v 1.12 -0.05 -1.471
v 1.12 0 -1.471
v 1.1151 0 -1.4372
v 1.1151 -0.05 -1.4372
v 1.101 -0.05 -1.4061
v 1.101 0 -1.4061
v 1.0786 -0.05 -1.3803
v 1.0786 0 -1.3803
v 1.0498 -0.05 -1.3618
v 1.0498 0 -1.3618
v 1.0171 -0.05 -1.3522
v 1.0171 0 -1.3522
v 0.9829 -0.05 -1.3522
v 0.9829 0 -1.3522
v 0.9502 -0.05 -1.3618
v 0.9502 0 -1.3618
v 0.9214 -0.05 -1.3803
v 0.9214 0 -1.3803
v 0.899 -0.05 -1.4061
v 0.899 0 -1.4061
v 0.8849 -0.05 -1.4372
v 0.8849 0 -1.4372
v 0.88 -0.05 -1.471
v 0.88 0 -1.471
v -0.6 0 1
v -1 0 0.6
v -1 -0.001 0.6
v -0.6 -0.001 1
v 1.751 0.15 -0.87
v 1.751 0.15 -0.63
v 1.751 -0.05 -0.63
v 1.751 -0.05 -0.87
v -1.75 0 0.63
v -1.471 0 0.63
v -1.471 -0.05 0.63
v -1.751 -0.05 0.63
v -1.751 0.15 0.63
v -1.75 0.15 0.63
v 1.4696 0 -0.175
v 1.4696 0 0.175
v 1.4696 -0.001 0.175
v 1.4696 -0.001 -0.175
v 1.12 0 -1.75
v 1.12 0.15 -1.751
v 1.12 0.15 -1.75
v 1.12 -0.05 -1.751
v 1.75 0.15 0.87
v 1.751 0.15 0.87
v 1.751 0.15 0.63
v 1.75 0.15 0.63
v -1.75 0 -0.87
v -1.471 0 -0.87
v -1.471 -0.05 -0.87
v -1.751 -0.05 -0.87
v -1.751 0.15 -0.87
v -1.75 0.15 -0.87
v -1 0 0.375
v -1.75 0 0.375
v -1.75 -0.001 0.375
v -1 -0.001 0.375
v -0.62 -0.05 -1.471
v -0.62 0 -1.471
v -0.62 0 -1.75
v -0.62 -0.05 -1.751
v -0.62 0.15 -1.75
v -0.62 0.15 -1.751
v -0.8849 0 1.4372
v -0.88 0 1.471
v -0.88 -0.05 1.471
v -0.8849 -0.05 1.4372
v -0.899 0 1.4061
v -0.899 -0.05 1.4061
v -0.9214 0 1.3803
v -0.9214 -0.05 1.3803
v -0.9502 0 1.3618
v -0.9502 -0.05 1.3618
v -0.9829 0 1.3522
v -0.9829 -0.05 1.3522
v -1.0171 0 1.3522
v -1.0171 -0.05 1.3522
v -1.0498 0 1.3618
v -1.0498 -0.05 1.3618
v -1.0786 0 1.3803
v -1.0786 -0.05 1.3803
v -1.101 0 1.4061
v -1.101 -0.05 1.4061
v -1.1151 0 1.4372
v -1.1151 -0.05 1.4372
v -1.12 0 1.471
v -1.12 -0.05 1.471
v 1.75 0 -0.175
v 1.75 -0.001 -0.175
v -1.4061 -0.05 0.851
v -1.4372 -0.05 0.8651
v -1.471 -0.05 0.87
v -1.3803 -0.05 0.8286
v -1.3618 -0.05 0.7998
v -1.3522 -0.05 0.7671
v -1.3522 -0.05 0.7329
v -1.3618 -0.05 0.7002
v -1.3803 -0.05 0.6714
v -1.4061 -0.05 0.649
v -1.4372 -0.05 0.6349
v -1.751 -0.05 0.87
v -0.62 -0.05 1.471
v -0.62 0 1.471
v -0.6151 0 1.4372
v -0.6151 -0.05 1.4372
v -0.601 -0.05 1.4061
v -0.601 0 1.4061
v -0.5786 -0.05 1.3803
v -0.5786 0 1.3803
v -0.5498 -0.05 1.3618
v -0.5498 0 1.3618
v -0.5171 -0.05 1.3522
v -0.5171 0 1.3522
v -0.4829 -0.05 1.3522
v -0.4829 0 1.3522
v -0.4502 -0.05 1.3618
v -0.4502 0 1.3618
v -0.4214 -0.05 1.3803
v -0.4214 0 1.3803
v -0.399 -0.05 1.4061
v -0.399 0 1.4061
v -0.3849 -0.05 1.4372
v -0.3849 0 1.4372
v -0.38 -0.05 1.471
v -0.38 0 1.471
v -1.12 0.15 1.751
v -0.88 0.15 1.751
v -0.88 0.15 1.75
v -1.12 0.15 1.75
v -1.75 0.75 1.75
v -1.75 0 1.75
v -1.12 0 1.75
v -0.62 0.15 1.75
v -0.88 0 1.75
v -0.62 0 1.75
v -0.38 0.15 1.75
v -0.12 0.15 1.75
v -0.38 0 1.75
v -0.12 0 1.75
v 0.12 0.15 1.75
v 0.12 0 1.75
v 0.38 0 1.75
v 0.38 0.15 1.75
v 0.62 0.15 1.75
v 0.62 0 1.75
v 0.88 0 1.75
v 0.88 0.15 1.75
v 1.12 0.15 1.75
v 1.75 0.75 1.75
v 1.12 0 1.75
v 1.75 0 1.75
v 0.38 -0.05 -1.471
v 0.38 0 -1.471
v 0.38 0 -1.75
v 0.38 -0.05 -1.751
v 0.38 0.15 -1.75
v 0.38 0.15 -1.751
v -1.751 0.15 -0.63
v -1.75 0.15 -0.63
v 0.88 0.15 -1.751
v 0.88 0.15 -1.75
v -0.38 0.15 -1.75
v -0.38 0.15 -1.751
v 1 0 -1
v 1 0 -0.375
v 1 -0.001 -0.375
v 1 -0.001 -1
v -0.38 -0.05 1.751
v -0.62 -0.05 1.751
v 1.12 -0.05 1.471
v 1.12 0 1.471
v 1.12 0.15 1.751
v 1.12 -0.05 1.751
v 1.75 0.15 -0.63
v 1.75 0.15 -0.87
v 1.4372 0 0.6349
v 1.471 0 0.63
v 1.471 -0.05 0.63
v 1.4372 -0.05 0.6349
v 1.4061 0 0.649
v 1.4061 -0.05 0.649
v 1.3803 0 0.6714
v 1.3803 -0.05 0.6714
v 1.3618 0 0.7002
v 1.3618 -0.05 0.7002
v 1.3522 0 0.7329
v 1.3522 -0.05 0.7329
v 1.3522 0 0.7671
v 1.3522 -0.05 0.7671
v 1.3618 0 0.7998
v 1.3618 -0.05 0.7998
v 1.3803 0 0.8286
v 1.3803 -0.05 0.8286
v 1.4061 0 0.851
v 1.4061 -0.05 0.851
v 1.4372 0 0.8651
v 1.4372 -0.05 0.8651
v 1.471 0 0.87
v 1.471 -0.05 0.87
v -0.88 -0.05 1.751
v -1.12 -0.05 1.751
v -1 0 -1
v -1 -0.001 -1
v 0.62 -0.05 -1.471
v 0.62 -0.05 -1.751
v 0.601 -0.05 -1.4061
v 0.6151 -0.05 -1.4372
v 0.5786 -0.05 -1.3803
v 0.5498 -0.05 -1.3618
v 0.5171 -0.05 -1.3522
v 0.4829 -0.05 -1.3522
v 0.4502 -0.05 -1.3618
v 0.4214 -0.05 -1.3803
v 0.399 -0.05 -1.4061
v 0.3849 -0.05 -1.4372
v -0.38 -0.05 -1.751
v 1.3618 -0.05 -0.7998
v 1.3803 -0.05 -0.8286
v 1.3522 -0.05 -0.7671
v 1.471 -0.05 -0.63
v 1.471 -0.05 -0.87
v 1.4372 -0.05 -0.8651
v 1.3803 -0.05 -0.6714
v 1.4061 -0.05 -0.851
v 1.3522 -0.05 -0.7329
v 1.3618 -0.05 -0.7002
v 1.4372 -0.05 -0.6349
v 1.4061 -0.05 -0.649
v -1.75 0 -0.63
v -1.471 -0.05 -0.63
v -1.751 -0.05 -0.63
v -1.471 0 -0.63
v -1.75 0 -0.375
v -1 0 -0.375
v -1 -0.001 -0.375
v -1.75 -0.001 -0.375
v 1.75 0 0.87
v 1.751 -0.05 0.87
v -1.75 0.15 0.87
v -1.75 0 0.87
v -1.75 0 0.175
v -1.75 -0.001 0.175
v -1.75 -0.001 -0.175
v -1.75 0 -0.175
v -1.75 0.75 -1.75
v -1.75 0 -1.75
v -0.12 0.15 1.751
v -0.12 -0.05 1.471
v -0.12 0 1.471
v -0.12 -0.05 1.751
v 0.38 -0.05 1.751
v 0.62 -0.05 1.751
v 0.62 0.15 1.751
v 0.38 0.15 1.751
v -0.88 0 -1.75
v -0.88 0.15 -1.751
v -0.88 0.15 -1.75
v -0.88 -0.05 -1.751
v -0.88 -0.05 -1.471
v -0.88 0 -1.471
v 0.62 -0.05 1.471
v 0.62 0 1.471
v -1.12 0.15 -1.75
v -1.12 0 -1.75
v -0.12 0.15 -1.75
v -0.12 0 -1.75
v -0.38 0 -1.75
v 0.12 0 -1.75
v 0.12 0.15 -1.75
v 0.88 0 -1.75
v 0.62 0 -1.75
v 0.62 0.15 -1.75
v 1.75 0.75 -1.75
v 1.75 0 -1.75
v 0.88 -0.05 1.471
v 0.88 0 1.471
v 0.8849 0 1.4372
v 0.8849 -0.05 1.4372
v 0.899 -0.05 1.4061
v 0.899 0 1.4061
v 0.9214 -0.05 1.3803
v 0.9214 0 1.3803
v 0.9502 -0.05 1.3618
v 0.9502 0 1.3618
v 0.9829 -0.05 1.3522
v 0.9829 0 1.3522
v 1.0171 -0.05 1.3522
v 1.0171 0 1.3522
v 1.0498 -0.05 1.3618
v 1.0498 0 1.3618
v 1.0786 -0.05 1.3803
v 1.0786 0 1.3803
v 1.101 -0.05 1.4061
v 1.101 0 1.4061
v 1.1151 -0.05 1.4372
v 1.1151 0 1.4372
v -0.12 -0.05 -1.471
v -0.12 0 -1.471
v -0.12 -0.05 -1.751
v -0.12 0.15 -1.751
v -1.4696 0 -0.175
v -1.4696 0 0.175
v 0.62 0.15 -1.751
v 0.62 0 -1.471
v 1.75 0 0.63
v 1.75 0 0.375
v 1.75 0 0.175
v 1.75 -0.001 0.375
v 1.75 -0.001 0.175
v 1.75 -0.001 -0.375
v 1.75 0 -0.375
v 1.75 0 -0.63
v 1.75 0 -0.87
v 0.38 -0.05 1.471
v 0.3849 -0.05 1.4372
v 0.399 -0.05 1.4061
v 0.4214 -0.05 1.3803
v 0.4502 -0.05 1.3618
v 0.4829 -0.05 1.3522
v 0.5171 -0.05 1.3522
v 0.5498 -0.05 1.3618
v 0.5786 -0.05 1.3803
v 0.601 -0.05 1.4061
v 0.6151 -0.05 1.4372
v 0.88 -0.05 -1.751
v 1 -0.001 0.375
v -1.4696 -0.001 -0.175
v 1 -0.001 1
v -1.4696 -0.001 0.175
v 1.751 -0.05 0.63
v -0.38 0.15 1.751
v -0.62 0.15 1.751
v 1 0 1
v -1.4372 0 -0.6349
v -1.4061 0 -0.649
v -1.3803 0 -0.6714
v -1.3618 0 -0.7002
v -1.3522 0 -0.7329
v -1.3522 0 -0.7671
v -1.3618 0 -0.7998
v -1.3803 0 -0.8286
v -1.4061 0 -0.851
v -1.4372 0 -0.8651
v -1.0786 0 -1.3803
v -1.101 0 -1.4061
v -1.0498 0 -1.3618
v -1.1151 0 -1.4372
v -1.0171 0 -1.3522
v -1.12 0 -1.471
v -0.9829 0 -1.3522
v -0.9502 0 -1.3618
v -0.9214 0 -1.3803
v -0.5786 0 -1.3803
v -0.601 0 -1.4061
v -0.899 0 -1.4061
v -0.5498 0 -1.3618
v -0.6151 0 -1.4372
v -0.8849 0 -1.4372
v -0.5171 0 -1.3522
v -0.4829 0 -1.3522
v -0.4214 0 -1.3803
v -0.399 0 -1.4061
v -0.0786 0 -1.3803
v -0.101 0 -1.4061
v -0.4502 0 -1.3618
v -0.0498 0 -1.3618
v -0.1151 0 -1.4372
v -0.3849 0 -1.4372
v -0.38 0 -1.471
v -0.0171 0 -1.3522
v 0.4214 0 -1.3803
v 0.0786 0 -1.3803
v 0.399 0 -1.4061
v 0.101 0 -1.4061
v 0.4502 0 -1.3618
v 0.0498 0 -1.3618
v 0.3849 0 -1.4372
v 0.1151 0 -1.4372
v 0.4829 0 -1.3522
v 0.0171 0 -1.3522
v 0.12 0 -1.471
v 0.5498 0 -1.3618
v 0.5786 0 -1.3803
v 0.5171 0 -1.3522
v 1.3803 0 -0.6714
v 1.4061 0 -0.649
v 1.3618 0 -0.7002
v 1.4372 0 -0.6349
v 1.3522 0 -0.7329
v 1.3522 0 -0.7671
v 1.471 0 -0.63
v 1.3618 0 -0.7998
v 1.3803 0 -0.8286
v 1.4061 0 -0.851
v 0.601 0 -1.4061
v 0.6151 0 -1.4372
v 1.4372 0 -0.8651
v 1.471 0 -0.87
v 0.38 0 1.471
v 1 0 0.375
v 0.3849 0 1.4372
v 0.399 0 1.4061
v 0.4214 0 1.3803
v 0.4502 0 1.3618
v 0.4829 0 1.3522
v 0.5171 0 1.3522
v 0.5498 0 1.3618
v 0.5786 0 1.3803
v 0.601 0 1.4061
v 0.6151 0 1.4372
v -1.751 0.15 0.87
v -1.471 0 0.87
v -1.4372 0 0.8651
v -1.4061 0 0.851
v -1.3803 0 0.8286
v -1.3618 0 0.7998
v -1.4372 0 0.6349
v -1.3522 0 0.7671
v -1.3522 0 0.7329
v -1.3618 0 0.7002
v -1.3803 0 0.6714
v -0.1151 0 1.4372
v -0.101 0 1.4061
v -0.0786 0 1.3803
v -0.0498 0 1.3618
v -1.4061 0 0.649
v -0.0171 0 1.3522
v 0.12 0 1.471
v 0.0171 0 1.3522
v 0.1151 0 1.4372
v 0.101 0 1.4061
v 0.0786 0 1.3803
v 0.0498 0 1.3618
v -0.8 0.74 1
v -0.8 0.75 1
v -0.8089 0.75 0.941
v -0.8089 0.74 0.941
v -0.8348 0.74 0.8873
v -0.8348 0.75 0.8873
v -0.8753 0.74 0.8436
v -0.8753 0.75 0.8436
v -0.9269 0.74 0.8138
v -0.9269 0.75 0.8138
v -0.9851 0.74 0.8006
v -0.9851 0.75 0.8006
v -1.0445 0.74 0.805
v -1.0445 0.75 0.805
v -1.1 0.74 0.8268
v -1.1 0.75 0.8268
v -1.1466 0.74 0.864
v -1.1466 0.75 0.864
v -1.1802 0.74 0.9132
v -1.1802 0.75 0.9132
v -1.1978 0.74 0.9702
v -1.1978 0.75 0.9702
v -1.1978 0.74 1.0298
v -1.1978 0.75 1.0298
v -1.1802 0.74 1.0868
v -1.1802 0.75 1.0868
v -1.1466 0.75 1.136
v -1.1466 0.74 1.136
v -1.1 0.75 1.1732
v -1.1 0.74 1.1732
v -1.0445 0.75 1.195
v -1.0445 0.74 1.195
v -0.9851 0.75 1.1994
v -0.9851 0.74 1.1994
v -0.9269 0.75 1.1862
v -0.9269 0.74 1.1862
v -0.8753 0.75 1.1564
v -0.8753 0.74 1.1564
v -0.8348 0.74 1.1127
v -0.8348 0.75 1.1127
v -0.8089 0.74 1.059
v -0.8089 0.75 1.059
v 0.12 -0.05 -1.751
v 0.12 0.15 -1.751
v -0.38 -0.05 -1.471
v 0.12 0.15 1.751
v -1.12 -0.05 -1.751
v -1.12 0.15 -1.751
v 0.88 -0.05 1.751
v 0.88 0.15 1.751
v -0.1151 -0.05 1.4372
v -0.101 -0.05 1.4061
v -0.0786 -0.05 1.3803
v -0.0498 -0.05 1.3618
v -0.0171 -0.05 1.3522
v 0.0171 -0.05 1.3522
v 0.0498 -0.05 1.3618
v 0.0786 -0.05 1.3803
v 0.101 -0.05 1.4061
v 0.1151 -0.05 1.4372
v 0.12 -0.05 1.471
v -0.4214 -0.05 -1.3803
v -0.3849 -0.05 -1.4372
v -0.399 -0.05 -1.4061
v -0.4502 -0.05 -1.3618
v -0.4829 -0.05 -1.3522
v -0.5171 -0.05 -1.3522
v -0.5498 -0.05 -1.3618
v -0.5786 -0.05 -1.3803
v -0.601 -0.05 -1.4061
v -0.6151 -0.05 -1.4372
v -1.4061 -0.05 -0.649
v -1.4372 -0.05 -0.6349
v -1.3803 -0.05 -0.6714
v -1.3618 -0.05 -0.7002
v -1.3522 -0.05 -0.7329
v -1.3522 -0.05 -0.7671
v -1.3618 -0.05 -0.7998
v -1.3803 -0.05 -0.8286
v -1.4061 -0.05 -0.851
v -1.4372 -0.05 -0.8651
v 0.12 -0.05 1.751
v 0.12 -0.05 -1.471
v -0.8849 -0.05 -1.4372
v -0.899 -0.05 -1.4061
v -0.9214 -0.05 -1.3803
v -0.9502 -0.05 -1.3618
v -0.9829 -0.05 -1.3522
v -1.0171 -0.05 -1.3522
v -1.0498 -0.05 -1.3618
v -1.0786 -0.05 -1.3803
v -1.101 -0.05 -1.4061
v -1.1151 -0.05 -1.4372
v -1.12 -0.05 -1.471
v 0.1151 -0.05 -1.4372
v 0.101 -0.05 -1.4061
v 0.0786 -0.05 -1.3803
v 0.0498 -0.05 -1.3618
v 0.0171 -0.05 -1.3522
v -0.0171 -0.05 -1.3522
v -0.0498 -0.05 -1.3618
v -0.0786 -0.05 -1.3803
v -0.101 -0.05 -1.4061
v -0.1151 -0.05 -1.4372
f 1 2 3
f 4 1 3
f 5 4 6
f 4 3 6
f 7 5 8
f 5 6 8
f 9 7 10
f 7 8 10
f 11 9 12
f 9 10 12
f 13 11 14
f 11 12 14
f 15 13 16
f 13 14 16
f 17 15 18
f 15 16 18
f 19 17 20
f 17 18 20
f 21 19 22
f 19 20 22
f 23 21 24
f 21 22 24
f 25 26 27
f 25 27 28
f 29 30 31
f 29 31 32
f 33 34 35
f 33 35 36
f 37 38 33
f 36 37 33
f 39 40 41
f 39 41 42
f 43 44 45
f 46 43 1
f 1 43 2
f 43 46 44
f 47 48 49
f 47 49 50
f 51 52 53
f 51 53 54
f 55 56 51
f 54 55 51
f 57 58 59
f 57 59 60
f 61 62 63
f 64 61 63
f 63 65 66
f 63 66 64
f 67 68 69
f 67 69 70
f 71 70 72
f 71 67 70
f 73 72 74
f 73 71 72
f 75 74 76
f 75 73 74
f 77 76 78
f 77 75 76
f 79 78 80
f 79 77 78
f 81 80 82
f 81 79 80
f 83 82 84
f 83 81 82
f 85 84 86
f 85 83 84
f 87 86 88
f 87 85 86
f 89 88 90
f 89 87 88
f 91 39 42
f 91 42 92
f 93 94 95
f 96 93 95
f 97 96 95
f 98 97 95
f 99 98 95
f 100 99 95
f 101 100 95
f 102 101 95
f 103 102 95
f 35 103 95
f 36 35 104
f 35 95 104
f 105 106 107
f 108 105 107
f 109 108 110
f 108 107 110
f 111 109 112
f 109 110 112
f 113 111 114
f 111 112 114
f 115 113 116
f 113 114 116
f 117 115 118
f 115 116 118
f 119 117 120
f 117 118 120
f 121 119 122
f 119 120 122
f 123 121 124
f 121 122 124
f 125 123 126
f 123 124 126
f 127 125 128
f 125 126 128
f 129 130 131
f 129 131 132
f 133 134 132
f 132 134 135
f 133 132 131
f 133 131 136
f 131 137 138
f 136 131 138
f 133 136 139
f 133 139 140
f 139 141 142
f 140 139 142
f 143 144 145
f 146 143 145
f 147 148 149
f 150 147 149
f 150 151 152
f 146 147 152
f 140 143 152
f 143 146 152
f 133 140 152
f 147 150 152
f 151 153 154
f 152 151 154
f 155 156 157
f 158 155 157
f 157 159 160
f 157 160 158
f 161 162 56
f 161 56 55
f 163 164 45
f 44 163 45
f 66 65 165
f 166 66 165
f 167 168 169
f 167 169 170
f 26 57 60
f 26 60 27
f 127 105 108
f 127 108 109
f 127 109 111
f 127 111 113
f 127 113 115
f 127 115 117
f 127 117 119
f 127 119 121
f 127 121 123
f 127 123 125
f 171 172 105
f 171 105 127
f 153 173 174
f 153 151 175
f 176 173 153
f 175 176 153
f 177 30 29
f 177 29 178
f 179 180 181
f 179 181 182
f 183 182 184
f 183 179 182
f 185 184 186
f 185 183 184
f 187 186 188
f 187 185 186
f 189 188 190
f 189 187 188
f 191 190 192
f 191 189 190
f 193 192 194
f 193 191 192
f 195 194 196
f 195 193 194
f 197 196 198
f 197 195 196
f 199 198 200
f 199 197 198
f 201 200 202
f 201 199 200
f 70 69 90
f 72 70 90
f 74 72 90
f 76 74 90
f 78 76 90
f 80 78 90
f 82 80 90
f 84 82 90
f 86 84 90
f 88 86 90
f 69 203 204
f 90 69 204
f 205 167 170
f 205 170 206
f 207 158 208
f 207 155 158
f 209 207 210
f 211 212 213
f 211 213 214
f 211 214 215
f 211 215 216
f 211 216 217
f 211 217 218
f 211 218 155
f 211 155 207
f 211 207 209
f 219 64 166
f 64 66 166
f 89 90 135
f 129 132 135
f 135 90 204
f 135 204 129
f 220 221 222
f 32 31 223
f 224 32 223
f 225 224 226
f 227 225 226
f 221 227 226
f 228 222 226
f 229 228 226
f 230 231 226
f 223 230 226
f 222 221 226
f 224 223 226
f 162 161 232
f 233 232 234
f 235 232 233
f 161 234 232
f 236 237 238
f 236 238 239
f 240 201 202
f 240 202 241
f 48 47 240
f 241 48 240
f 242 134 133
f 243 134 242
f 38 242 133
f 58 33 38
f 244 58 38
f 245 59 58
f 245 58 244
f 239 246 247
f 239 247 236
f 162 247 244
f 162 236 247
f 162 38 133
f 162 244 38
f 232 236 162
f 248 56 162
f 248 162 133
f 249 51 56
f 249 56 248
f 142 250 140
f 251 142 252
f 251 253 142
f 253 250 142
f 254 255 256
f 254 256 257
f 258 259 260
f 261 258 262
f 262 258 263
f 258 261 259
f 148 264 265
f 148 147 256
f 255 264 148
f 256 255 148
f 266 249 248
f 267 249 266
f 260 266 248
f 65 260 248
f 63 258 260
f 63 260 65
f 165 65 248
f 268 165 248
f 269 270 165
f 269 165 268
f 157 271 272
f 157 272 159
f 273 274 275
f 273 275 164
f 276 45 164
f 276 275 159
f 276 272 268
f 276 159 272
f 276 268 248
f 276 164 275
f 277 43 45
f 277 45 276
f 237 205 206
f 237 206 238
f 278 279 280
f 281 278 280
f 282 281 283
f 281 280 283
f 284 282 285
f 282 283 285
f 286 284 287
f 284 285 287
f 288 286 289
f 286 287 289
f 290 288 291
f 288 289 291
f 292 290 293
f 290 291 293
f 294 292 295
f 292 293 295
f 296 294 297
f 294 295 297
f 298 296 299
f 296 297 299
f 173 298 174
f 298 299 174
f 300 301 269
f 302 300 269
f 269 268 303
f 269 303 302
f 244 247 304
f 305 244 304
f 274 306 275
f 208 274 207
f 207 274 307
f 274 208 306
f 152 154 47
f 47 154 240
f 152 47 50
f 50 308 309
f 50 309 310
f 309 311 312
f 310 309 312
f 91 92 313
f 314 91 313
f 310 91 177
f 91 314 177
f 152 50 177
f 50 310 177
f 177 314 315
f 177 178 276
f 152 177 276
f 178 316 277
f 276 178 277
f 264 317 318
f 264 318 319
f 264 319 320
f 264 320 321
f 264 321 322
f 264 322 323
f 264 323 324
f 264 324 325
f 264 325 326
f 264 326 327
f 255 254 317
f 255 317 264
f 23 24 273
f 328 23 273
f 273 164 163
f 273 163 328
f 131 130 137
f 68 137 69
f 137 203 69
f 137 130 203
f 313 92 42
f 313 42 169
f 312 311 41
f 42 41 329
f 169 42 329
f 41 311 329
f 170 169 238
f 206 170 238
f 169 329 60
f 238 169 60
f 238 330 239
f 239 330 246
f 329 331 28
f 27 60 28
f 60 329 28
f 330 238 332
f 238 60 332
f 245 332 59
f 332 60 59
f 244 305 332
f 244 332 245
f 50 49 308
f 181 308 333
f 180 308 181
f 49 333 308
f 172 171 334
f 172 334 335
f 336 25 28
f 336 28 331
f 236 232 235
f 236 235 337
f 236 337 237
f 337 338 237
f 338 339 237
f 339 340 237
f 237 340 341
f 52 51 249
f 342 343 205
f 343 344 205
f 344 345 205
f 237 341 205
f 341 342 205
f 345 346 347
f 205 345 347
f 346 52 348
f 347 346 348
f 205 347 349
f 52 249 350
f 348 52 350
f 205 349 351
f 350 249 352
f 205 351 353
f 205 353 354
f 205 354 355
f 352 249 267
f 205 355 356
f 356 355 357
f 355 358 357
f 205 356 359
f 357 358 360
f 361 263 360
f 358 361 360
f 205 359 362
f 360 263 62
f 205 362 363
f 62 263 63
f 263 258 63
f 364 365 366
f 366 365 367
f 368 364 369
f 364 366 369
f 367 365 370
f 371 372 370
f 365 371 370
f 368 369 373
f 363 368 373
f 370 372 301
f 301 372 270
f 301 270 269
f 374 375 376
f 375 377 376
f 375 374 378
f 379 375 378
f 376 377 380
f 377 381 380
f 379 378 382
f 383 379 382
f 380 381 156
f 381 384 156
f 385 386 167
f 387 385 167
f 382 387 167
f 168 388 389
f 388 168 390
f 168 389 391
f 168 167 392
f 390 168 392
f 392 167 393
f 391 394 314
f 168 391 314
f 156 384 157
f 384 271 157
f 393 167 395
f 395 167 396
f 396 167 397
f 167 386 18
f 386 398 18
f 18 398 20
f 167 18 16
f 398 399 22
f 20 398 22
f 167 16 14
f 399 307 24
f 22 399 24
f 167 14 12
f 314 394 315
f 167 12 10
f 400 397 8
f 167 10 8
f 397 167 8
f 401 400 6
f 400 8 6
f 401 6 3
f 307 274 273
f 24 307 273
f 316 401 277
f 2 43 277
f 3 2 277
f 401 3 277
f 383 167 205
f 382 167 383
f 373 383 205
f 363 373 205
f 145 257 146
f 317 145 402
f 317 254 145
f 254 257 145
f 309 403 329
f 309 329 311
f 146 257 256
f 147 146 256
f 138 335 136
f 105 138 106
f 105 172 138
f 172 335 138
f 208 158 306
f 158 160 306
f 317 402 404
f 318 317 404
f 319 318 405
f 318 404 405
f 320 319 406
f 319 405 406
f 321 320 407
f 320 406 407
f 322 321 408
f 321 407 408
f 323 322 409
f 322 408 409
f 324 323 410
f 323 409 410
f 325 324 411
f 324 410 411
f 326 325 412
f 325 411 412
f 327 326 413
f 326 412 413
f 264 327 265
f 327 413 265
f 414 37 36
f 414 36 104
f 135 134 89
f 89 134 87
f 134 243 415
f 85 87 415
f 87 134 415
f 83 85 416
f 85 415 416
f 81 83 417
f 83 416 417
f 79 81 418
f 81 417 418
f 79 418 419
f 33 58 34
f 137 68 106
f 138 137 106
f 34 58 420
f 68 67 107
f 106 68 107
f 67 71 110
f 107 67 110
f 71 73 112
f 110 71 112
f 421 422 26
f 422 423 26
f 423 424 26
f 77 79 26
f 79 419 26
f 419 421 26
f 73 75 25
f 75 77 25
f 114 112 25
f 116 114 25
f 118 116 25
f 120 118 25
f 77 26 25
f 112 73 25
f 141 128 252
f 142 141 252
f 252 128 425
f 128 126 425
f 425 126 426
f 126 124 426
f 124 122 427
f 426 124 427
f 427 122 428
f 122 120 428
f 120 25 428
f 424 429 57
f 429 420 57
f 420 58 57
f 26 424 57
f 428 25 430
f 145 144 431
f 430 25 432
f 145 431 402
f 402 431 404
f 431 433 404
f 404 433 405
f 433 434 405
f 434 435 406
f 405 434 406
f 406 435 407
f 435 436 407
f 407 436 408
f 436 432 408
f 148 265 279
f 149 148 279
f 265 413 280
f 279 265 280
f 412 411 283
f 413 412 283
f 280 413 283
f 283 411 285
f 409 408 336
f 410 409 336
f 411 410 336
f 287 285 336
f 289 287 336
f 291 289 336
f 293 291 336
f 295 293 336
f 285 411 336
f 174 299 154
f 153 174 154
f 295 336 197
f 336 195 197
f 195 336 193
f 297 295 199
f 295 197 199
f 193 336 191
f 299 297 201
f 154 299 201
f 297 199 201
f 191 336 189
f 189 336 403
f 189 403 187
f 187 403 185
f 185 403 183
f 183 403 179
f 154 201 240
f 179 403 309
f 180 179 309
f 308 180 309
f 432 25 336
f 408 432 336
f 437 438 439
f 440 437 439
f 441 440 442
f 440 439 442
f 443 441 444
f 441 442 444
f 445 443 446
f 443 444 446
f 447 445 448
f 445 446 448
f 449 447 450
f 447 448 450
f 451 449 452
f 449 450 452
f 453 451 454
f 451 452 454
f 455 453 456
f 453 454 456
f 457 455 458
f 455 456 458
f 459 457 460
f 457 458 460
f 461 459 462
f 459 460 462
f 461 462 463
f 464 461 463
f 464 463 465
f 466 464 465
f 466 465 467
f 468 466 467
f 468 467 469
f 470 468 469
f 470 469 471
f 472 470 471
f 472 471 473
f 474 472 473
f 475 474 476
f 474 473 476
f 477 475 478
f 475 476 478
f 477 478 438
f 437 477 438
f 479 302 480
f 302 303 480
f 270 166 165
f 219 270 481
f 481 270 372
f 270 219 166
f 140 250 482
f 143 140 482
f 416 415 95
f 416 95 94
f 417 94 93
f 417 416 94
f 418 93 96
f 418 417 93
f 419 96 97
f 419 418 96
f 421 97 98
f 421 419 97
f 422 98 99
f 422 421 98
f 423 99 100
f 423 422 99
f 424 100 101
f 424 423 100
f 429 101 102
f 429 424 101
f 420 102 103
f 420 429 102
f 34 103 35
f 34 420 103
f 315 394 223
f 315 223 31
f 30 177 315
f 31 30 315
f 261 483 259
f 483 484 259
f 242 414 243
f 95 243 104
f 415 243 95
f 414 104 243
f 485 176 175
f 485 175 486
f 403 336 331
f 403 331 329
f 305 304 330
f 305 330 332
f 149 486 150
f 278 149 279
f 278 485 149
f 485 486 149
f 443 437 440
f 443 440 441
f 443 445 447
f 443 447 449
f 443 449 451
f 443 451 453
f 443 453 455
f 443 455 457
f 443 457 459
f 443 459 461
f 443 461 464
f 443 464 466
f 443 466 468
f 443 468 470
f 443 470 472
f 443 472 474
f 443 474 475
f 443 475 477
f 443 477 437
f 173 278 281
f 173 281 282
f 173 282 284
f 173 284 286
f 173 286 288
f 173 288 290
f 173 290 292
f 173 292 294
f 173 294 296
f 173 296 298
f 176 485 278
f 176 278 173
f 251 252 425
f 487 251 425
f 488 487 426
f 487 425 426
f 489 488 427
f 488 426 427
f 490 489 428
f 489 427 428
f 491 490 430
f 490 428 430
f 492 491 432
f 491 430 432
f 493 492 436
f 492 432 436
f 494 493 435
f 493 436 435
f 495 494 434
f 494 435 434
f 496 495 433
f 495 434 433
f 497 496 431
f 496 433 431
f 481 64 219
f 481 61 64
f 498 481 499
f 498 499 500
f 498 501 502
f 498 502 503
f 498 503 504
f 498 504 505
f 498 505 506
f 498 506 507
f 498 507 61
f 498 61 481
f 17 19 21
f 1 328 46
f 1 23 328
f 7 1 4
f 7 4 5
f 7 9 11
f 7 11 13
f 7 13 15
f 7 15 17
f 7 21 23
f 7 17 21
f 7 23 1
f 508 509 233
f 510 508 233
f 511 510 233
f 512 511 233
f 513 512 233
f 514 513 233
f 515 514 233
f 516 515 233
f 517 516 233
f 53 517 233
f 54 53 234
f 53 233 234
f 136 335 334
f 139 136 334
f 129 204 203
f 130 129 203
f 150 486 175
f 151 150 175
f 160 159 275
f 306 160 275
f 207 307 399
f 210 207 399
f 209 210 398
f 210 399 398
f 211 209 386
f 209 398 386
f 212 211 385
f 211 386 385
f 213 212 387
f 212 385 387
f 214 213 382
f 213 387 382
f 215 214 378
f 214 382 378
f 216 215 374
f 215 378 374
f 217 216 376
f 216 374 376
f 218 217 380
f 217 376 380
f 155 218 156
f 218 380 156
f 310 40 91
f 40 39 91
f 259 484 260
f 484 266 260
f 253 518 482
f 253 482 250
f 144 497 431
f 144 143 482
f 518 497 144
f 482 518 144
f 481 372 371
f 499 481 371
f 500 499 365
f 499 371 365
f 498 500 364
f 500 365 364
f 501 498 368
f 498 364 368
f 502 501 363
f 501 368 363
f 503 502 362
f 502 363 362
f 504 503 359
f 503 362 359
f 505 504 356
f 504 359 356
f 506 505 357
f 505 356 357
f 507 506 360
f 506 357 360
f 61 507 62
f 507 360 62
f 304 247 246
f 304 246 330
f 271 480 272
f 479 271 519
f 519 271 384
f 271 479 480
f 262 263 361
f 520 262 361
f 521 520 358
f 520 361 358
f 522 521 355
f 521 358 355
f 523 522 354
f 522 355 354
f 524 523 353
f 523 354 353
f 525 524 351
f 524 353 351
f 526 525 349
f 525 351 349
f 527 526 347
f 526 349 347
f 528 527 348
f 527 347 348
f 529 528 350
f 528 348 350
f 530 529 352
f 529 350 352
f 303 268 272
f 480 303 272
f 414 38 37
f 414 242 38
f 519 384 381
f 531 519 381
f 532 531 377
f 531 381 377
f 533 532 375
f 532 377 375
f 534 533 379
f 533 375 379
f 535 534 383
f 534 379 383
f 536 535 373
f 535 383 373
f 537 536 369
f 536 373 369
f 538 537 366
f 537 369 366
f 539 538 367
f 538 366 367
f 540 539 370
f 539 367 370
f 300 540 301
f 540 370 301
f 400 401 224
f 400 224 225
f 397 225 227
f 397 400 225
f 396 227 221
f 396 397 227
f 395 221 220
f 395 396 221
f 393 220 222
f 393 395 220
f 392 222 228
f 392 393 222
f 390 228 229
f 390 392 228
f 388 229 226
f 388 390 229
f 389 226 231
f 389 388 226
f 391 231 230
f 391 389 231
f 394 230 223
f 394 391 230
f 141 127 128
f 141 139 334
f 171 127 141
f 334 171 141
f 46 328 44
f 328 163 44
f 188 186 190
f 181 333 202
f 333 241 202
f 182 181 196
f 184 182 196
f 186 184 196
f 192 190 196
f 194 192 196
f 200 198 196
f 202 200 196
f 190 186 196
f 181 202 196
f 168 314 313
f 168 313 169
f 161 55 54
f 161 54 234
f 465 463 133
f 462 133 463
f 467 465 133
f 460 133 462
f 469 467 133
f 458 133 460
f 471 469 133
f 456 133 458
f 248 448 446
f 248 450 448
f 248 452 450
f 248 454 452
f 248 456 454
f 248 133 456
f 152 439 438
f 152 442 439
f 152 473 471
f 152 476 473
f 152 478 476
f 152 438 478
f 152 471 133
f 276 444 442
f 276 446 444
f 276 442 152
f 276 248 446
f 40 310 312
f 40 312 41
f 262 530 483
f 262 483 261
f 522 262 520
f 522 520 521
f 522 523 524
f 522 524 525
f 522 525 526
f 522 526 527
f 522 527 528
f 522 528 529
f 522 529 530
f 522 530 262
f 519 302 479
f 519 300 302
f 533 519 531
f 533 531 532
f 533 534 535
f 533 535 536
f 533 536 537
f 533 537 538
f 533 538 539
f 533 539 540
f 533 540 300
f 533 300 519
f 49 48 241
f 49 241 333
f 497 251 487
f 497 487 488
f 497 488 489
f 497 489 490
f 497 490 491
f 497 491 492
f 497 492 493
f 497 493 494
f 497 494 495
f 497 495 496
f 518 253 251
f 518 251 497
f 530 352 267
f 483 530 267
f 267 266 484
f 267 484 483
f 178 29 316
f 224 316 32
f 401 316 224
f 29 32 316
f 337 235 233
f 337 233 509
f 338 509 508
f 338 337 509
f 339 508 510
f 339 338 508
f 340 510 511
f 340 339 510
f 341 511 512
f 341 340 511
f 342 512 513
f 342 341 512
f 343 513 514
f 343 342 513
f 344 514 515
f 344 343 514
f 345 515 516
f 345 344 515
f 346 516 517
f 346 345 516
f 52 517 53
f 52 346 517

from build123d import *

# Parameters (mm, degrees)
SKETCH1_W                = 3.5
SKETCH1_H                = 3.5
BOSS_EXTRUDE1_DEPTH      = 0.75
SKETCH2_R                = 0.2
CUT_EXTRUDE1_DEPTH       = 0.01
BOSS_EXTRUDE2_DEPTH      = 0.05
BOSS_EXTRUDE2_DEPTH_BACK = 0.15
BOSS_EXTRUDE3_DEPTH      = 0.001


with BuildPart() as part:
    # Sketch1 → Boss-Extrude1 (new body)
    with BuildSketch(Plane(origin=(0, 0, 0), x_dir=(1, 0, 0), z_dir=(0, 1, 0))):
        Rectangle(SKETCH1_W, SKETCH1_H)
    extrude(amount=BOSS_EXTRUDE1_DEPTH)

    # Sketch2 → Cut-Extrude1 (cut)
    with BuildSketch(Plane(origin=(0, 0.75, 0), x_dir=(1, 0, 0), z_dir=(0, 1, 0))):
        with Locations((-1, -1)):
            Circle(SKETCH2_R)
    extrude(amount=-CUT_EXTRUDE1_DEPTH, mode=Mode.SUBTRACT)

    # Sketch3 → Boss-Extrude2 (add, two sides)
    with BuildSketch(Plane.XZ) as boss_extrude2_sk:
        with BuildLine():
            Line((-1.12, 1.751), (-0.88, 1.751))
            Line((-0.88, 1.751), (-0.88, 1.471))
            ThreePointArc((-0.88, 1.471), (-1, 1.351), (-1.12, 1.471))
            Line((-1.12, 1.471), (-1.12, 1.751))
        make_face()
        with BuildLine():
            Line((-1.751, 0.63), (-1.751, 0.87))
            Line((-1.751, 0.87), (-1.471, 0.87))
            ThreePointArc((-1.471, 0.87), (-1.351, 0.75), (-1.471, 0.63))
            Line((-1.471, 0.63), (-1.751, 0.63))
        make_face()
        with BuildLine():
            Line((-0.62, 1.751), (-0.62, 1.471))
            ThreePointArc((-0.62, 1.471), (-0.5, 1.351), (-0.38, 1.471))
            Line((-0.38, 1.471), (-0.38, 1.751))
            Line((-0.38, 1.751), (-0.62, 1.751))
        make_face()
        with BuildLine():
            Line((-0.12, 1.751), (-0.12, 1.471))
            ThreePointArc((-0.12, 1.471), (0, 1.351), (0.12, 1.471))
            Line((0.12, 1.471), (0.12, 1.751))
            Line((0.12, 1.751), (-0.12, 1.751))
        make_face()
        with BuildLine():
            Line((0.38, 1.751), (0.38, 1.471))
            ThreePointArc((0.38, 1.471), (0.5, 1.351), (0.62, 1.471))
            Line((0.62, 1.471), (0.62, 1.751))
            Line((0.62, 1.751), (0.38, 1.751))
        make_face()
        with BuildLine():
            Line((0.88, 1.751), (0.88, 1.471))
            ThreePointArc((0.88, 1.471), (1, 1.351), (1.12, 1.471))
            Line((1.12, 1.471), (1.12, 1.751))
            Line((1.12, 1.751), (0.88, 1.751))
        make_face()
        with BuildLine():
            Line((1.751, -0.63), (1.751, -0.87))
            Line((1.751, -0.87), (1.471, -0.87))
            ThreePointArc((1.471, -0.87), (1.351, -0.75), (1.471, -0.63))
            Line((1.471, -0.63), (1.751, -0.63))
        make_face()
        with BuildLine():
            Line((0.88, -1.751), (1.12, -1.751))
            Line((1.12, -1.751), (1.12, -1.471))
            ThreePointArc((1.12, -1.471), (1, -1.351), (0.88, -1.471))
            Line((0.88, -1.471), (0.88, -1.751))
        make_face()
        with BuildLine():
            Line((0.38, -1.751), (0.62, -1.751))
            Line((0.62, -1.751), (0.62, -1.471))
            ThreePointArc((0.62, -1.471), (0.5, -1.351), (0.38, -1.471))
            Line((0.38, -1.471), (0.38, -1.751))
        make_face()
        with BuildLine():
            Line((-0.12, -1.751), (0.12, -1.751))
            Line((0.12, -1.751), (0.12, -1.471))
            ThreePointArc((0.12, -1.471), (0, -1.351), (-0.12, -1.471))
            Line((-0.12, -1.471), (-0.12, -1.751))
        make_face()
        with BuildLine():
            Line((-0.62, -1.751), (-0.38, -1.751))
            Line((-0.38, -1.751), (-0.38, -1.471))
            ThreePointArc((-0.38, -1.471), (-0.5, -1.351), (-0.62, -1.471))
            Line((-0.62, -1.471), (-0.62, -1.751))
        make_face()
        with BuildLine():
            Line((-1.751, -0.63), (-1.471, -0.63))
            ThreePointArc((-1.471, -0.63), (-1.351, -0.75), (-1.471, -0.87))
            Line((-1.471, -0.87), (-1.751, -0.87))
            Line((-1.751, -0.87), (-1.751, -0.63))
        make_face()
        with BuildLine():
            Line((-0.88, -1.751), (-0.88, -1.471))
            ThreePointArc((-0.88, -1.471), (-1, -1.351), (-1.12, -1.471))
            Line((-1.12, -1.471), (-1.12, -1.751))
            Line((-1.12, -1.751), (-0.88, -1.751))
        make_face()
        with BuildLine():
            Line((1.751, 0.63), (1.471, 0.63))
            ThreePointArc((1.471, 0.63), (1.351, 0.75), (1.471, 0.87))
            Line((1.471, 0.87), (1.751, 0.87))
            Line((1.751, 0.87), (1.751, 0.63))
        make_face()
    extrude(amount=BOSS_EXTRUDE2_DEPTH)
    extrude(boss_extrude2_sk.sketch, amount=-BOSS_EXTRUDE2_DEPTH_BACK)

    # Sketch4 → Boss-Extrude3 (add)
    with BuildSketch(Plane.XZ):
        Polygon((-1, 0.6), (-0.6, 1), (1, 1), (1, 0.375), (1.75, 0.375), (1.75, 0.175), (1.469620109, 0.175), (1.469620109, -0.175), (1.75, -0.175), (1.75, -0.375), (1, -0.375), (1, -1), (-1, -1), (-1, -0.375), (-1.75, -0.375), (-1.75, -0.175), (-1.469620109, -0.175), (-1.469620109, 0.175), (-1.75, 0.175), (-1.75, 0.375), (-1, 0.375), align=None)
    extrude(amount=BOSS_EXTRUDE3_DEPTH)


solid = part.part
